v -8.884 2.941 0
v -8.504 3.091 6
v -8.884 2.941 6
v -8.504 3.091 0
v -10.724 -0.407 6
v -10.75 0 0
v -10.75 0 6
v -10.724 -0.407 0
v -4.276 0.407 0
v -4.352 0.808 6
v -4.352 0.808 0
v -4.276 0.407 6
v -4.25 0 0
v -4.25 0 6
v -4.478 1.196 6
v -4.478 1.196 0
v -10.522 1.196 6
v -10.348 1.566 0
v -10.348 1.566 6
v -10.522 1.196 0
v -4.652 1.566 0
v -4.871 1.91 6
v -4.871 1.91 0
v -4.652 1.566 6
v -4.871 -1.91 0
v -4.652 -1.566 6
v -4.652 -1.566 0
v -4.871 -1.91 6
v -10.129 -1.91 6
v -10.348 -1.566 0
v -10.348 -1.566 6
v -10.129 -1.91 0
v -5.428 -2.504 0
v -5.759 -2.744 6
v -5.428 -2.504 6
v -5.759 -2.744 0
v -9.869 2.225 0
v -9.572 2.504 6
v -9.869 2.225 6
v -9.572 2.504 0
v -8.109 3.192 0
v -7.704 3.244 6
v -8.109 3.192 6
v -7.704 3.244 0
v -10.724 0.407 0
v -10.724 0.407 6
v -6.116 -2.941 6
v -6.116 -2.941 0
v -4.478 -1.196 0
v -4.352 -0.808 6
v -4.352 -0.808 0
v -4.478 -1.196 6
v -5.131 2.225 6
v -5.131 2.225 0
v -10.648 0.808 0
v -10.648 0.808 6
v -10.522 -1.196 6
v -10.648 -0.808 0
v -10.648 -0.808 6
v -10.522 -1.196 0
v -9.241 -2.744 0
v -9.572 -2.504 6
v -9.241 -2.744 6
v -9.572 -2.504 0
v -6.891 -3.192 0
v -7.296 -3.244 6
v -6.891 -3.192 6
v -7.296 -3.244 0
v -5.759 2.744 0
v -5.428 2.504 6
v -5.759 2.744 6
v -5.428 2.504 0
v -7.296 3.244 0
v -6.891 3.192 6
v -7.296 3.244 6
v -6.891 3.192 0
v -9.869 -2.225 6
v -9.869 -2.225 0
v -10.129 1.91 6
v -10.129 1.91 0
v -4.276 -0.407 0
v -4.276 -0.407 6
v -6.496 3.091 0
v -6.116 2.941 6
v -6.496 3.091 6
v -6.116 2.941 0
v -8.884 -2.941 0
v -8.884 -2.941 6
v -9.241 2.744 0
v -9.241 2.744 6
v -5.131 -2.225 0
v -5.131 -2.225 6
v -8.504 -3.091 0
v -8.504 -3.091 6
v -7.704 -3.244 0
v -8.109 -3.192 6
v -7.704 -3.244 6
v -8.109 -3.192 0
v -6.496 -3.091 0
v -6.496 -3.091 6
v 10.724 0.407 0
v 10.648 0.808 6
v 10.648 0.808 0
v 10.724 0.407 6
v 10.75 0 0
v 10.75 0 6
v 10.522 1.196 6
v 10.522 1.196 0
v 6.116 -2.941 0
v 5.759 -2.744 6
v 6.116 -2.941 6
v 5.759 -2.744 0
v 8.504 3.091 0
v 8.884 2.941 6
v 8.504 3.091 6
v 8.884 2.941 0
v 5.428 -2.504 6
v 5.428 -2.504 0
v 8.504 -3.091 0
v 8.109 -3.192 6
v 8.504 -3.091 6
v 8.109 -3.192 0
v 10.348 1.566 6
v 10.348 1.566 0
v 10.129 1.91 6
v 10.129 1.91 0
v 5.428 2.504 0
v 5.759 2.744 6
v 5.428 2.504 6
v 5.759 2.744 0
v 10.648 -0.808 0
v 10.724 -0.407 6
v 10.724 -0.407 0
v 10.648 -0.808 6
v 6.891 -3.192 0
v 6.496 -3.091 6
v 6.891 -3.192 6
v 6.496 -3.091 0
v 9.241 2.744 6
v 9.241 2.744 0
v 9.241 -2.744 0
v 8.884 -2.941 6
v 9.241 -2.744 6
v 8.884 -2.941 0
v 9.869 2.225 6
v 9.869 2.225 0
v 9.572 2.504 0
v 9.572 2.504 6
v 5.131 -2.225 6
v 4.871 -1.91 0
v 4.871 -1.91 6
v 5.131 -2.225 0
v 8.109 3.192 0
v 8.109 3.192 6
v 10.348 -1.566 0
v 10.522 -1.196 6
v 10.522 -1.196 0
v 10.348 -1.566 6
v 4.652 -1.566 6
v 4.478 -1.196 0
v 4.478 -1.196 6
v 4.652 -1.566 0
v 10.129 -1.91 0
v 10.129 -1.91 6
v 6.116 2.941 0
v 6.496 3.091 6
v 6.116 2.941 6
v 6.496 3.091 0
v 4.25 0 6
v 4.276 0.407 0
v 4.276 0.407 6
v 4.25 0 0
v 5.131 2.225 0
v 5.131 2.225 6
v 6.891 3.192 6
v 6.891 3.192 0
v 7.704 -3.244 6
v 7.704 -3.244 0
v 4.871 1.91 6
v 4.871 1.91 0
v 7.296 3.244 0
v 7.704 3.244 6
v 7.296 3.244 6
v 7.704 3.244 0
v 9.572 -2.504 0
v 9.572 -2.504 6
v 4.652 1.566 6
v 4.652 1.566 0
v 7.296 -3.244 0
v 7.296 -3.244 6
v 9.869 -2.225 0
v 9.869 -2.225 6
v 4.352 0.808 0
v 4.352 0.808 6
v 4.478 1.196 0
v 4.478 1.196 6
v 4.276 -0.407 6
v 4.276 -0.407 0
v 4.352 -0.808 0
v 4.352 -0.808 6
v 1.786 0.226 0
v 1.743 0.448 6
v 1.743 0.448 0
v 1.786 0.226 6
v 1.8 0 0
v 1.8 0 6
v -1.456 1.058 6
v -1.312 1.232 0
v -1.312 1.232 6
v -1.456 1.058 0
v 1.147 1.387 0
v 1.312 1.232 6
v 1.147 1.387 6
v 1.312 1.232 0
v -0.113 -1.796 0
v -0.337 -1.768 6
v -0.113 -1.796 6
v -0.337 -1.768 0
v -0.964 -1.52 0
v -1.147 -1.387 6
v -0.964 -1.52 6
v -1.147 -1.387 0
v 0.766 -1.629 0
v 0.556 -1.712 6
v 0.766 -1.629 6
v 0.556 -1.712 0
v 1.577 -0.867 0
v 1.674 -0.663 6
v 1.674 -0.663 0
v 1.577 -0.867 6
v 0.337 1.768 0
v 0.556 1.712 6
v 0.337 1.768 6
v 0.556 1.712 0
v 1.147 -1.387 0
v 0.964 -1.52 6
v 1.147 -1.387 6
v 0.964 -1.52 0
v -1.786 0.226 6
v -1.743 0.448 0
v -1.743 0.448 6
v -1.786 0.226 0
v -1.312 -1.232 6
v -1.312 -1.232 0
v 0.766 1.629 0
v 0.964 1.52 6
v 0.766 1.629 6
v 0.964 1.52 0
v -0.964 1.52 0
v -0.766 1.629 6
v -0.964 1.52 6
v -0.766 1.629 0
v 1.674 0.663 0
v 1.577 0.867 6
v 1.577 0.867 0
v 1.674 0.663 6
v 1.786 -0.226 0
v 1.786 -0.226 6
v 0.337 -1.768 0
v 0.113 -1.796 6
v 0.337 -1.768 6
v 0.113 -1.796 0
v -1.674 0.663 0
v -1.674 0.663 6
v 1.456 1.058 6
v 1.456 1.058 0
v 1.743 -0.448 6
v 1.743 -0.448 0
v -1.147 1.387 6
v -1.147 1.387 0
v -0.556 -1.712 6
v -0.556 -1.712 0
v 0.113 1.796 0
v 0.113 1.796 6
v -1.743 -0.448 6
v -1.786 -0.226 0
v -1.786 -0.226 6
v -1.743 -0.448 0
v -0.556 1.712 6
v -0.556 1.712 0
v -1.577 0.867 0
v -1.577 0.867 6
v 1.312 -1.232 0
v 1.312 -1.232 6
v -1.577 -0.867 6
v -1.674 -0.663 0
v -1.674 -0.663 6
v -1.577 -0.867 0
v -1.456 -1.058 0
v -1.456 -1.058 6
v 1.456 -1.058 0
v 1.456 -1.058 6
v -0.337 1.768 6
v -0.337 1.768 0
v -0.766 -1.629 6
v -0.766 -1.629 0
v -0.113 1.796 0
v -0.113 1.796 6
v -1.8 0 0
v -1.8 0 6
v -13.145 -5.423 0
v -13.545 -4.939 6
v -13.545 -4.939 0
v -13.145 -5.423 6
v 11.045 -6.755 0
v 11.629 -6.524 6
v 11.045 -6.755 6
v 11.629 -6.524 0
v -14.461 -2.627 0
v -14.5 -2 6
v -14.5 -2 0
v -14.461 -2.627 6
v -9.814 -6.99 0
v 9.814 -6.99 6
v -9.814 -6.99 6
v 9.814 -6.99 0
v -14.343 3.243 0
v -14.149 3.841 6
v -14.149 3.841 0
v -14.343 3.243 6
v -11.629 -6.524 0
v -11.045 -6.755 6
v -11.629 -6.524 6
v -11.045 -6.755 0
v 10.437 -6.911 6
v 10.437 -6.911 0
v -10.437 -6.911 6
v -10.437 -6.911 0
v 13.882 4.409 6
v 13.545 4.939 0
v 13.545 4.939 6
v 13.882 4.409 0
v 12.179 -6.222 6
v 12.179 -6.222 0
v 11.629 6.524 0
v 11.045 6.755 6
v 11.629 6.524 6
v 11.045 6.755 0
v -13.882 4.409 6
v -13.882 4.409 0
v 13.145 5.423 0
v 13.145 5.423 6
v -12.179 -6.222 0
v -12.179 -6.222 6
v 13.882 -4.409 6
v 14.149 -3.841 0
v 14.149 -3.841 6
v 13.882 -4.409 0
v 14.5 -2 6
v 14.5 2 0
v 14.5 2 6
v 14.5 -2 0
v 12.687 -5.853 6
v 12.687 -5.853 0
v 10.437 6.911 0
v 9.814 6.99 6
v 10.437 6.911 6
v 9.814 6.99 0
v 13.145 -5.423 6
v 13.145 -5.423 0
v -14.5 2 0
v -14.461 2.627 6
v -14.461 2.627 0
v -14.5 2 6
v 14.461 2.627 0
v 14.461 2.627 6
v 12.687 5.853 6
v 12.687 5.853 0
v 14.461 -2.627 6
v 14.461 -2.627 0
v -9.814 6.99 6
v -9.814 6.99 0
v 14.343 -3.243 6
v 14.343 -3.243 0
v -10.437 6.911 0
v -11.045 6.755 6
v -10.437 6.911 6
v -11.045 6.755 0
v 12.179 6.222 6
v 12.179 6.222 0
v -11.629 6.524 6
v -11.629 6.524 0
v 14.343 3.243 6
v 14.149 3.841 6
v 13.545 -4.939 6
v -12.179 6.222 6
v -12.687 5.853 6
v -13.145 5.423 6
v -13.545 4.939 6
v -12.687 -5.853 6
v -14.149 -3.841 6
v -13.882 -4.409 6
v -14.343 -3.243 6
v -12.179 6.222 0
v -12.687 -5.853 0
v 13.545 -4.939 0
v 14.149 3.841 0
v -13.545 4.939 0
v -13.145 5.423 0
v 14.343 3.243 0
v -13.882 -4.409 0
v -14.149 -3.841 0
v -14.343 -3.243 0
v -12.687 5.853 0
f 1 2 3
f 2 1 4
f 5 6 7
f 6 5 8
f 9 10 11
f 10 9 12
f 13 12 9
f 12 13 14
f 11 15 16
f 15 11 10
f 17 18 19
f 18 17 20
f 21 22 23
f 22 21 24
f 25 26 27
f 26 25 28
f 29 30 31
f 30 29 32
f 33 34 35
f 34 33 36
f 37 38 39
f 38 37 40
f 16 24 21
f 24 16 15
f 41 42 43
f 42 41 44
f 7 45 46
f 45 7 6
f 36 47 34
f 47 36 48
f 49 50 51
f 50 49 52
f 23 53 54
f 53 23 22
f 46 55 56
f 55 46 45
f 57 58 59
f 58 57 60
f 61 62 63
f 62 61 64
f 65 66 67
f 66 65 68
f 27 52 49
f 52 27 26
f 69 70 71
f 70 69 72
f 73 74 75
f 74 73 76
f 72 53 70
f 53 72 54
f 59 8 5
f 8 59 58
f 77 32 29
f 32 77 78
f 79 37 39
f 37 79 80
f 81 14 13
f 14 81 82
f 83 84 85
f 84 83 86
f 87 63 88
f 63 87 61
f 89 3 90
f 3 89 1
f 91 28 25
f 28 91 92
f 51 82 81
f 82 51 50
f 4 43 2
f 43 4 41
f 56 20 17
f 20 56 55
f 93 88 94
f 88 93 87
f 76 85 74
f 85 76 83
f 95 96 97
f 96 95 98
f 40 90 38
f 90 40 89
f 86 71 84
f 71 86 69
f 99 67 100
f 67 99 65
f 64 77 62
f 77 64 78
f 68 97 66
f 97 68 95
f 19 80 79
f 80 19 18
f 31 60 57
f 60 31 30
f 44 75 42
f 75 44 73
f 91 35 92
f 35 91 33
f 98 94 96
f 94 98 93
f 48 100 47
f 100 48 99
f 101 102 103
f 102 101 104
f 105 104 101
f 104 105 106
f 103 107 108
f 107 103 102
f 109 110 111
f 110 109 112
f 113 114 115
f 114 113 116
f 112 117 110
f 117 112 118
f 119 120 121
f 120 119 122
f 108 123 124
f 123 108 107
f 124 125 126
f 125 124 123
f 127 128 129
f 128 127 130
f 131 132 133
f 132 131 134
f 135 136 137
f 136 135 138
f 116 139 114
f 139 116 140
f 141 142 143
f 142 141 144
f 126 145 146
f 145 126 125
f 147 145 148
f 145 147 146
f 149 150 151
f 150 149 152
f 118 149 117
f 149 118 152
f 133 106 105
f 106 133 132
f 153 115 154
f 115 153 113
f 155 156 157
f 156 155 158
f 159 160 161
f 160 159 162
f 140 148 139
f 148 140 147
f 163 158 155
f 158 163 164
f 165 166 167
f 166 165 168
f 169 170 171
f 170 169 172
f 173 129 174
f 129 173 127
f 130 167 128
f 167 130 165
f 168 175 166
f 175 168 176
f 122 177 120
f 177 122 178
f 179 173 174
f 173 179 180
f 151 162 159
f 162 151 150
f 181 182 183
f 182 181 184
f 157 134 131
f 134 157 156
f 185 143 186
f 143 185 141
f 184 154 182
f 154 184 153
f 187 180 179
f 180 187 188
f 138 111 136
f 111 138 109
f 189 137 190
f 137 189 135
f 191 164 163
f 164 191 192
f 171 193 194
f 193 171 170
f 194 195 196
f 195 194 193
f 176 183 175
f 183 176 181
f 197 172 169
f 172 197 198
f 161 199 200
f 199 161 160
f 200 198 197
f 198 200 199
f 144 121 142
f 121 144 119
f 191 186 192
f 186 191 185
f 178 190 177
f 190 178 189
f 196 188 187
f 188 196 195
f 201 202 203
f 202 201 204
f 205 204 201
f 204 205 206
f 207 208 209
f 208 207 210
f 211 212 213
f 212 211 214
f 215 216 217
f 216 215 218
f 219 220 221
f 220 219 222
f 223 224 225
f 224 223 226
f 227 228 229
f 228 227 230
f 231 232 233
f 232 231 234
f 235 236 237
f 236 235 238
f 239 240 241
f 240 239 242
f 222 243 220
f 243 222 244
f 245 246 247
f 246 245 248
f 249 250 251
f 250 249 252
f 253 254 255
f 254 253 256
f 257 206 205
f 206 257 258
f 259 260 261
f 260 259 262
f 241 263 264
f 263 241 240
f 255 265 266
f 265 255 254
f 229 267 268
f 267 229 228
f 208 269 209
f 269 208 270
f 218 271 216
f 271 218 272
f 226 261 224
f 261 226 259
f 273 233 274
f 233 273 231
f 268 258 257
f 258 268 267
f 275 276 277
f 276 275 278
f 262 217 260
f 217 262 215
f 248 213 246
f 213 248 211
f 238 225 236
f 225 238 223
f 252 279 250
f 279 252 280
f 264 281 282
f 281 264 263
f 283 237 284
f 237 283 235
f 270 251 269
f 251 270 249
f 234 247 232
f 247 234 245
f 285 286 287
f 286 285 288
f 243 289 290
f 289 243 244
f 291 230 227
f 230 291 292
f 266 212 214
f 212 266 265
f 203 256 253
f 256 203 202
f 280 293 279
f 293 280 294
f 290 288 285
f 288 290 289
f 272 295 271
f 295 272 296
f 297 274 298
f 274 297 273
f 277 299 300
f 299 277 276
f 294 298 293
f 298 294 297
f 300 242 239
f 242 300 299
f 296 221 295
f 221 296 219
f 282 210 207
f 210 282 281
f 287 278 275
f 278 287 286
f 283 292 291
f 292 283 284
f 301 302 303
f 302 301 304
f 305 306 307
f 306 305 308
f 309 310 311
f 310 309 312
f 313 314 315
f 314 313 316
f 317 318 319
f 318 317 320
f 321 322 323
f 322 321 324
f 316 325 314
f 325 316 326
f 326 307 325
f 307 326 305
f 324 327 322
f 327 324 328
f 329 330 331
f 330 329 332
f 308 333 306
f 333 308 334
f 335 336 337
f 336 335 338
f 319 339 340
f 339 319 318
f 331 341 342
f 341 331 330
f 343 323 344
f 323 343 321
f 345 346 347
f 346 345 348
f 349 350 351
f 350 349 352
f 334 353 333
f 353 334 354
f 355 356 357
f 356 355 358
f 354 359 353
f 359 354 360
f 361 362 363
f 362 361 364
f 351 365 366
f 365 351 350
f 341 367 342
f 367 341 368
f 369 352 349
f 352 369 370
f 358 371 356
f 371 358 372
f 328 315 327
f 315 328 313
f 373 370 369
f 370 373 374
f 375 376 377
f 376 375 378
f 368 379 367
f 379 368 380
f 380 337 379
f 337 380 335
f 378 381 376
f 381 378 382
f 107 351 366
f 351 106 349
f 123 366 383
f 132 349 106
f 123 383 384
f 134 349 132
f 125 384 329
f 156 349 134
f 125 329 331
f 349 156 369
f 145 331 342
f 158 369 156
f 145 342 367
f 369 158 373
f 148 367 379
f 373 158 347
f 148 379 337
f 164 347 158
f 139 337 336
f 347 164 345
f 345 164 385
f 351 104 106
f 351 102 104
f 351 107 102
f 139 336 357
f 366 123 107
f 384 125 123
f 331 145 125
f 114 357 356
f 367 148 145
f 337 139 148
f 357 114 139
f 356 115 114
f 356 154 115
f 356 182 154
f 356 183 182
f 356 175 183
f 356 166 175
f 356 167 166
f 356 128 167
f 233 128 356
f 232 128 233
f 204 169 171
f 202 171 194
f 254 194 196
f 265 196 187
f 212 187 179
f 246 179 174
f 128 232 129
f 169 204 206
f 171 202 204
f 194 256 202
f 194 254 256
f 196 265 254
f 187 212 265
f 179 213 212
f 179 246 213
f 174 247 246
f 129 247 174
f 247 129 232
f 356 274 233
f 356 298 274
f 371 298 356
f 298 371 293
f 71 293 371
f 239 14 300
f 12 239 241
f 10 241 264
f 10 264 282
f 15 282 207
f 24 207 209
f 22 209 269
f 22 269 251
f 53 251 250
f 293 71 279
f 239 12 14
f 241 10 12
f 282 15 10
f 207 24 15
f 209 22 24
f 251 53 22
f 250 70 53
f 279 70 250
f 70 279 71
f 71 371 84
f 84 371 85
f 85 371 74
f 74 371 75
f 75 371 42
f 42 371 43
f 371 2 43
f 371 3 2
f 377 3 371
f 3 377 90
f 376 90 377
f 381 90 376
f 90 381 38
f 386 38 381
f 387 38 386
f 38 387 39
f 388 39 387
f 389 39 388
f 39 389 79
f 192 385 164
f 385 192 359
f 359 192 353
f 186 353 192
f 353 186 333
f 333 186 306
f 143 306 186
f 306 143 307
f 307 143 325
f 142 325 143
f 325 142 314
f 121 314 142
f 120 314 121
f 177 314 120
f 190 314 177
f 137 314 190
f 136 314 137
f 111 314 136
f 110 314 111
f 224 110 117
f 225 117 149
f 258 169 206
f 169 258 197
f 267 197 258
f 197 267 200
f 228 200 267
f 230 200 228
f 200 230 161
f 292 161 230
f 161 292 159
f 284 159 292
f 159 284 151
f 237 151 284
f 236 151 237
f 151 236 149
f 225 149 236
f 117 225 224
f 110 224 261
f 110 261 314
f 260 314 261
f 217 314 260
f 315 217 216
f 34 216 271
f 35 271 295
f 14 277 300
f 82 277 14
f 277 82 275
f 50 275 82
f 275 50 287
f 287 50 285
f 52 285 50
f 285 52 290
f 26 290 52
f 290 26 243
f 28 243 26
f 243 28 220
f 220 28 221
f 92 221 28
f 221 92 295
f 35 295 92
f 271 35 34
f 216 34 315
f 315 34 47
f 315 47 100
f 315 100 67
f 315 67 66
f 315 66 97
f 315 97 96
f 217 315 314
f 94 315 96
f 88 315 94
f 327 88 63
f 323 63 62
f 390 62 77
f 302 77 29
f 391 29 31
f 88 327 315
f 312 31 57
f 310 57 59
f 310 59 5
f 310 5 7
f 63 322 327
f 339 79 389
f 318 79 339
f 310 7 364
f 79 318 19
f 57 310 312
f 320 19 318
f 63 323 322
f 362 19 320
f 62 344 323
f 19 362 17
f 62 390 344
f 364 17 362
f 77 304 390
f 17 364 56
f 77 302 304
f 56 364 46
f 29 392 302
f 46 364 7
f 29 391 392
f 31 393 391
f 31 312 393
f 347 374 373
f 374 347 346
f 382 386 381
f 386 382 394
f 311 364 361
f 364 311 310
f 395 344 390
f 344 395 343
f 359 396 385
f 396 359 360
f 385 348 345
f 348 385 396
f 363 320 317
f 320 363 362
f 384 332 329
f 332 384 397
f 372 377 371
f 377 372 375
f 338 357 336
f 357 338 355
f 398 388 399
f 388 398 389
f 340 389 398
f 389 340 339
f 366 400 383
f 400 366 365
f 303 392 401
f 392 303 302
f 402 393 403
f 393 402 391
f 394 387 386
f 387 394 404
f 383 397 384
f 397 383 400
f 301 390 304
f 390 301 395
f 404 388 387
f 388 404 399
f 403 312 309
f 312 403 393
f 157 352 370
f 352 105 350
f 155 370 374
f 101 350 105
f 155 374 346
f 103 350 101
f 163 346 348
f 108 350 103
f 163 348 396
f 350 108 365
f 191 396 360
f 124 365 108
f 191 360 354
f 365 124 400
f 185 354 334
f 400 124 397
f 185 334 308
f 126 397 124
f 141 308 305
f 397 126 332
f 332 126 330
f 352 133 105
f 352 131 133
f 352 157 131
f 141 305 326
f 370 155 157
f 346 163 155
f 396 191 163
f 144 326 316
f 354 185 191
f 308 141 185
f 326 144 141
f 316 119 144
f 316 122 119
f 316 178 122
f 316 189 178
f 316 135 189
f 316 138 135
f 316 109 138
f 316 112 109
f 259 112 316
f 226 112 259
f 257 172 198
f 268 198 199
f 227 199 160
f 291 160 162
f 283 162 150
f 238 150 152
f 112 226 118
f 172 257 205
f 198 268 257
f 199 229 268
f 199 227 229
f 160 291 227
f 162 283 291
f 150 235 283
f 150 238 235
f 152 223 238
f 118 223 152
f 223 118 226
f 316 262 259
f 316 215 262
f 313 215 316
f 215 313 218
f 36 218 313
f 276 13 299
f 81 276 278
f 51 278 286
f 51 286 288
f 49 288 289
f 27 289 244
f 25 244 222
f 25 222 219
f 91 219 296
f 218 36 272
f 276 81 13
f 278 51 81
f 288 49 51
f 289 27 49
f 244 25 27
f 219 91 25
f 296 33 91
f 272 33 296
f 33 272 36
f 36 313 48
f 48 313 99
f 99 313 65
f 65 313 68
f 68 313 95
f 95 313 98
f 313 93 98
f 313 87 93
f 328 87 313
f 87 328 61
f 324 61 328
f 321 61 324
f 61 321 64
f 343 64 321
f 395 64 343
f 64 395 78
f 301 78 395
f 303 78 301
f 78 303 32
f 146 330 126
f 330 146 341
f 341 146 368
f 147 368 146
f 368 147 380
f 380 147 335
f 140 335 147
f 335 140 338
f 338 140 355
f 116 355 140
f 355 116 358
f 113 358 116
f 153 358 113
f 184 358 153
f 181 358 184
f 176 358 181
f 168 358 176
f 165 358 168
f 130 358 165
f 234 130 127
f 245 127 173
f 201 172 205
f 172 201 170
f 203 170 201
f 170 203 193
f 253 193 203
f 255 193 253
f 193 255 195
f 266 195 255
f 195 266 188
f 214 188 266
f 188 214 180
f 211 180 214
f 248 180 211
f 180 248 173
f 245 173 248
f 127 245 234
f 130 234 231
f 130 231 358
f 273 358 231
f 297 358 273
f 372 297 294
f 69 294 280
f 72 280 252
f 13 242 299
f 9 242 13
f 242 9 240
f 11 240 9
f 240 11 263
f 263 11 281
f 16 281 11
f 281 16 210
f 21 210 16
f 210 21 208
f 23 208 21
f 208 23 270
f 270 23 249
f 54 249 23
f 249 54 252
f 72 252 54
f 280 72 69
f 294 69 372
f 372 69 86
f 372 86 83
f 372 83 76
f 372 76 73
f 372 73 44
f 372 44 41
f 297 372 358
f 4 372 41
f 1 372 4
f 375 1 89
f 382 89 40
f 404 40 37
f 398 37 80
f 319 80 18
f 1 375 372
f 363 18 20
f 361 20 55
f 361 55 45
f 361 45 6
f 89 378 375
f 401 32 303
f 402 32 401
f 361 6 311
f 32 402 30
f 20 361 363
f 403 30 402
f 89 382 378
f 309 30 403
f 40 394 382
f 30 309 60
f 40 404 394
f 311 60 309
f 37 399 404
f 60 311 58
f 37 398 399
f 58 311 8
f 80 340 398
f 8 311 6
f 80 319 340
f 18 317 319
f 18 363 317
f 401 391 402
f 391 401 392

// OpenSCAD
$fn = 50;


difference() {
	union() {
		hull() {
			translate(v = [-9.5000000000, 2.0000000000, 0]) {
				cylinder(h = 6, r = 5);
			}
			translate(v = [9.5000000000, 2.0000000000, 0]) {
				cylinder(h = 6, r = 5);
			}
			translate(v = [-9.5000000000, -2.0000000000, 0]) {
				cylinder(h = 6, r = 5);
			}
			translate(v = [9.5000000000, -2.0000000000, 0]) {
				cylinder(h = 6, r = 5);
			}
		}
	}
	union() {
		translate(v = [-7.5000000000, 0.0000000000, 0]) {
			translate(v = [0, 0, -100]) {
				cylinder(h = 200, r = 3.2500000000);
			}
		}
		translate(v = [7.5000000000, 0.0000000000, 0]) {
			translate(v = [0, 0, -100]) {
				cylinder(h = 200, r = 3.2500000000);
			}
		}
		translate(v = [-7.5000000000, 0.0000000000, 0]) {
			translate(v = [0, 0, -100]) {
				cylinder(h = 200, r = 1.8000000000);
			}
		}
		translate(v = [0, 0, -100]) {
			cylinder(h = 200, r = 1.8000000000);
		}
		translate(v = [7.5000000000, 0.0000000000, 0]) {
			translate(v = [0, 0, -100]) {
				cylinder(h = 200, r = 1.8000000000);
			}
		}
	}
}
